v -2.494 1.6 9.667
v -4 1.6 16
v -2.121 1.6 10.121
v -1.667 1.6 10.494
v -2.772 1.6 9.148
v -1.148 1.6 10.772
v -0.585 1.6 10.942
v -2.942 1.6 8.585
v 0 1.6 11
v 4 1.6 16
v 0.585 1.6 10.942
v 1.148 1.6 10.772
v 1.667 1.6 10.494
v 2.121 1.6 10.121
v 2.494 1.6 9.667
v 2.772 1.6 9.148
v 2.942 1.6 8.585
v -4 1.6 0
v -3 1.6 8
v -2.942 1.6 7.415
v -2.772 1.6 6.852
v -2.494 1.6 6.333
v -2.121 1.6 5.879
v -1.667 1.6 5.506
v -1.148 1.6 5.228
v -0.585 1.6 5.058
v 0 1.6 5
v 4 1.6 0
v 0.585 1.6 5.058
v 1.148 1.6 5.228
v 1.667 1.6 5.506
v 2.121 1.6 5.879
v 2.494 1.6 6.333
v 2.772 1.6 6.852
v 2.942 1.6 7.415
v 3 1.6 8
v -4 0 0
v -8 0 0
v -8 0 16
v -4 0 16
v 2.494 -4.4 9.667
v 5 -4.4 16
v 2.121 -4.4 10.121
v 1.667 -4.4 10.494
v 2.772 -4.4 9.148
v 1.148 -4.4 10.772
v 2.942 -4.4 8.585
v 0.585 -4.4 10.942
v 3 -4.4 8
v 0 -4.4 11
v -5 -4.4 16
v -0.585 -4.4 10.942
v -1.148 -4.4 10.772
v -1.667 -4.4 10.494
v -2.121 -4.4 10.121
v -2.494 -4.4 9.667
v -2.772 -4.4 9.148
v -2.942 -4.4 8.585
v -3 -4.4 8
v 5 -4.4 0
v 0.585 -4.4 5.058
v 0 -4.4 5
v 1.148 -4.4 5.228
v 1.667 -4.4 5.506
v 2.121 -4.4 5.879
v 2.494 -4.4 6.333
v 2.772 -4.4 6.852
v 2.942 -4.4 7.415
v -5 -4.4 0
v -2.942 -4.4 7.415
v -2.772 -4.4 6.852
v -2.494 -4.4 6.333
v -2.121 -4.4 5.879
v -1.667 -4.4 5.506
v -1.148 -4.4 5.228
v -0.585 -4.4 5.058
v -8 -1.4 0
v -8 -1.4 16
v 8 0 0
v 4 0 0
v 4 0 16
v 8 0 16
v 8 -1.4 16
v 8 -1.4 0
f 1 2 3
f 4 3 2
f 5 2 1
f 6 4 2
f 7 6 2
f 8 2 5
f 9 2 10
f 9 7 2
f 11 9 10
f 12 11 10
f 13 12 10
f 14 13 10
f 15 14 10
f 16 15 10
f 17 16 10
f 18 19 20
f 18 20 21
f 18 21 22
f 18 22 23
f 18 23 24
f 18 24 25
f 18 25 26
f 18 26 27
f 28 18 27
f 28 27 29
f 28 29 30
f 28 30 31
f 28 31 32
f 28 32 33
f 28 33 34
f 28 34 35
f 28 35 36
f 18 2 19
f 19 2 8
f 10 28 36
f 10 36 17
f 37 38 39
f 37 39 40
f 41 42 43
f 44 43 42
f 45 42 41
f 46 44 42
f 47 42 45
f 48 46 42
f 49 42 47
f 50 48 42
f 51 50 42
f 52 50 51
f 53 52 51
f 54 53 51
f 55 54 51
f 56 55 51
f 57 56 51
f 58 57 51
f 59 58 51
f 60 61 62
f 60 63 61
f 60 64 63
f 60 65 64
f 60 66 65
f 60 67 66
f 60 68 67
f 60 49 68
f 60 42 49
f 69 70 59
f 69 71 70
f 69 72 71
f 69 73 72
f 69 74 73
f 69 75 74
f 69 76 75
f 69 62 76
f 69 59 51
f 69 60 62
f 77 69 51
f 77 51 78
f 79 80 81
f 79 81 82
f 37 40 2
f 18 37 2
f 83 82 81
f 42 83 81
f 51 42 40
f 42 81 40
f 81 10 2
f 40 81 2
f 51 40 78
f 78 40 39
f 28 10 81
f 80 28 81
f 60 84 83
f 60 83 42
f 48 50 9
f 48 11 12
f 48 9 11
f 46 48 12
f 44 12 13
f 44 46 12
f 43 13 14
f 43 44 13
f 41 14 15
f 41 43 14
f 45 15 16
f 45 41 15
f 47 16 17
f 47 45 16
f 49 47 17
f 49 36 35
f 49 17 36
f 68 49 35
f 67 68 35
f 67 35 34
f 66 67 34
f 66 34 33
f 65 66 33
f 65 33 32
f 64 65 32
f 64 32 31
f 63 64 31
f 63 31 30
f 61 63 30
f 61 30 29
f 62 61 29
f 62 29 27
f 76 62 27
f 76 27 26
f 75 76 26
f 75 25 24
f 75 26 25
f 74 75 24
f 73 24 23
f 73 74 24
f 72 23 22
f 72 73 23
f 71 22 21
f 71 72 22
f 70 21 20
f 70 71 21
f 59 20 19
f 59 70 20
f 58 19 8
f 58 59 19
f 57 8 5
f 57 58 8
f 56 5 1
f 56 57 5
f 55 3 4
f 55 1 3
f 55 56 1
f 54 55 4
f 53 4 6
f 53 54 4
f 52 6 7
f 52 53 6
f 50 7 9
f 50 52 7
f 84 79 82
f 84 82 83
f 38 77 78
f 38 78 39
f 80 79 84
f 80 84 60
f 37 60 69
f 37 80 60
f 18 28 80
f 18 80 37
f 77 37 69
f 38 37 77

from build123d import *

# Parameters (mm, degrees)
EXTRUDE_1_DEPTH          = 16
CUT_EXTRUDE_1_DEPTH      = 19.421726303
CUT_EXTRUDE_1_DEPTH_BACK = 19.421726303
SKETCH_2_R               = 3


with BuildPart() as part:
    # 草图1 → 凸台-拉伸1 (new body)
    with BuildSketch(Plane.XY):
        Polygon((5, -4.4), (-5, -4.4), (-8, -1.4), (-8, 0), (-4, 0), (-4, 1.6), (4, 1.6), (4, 0), (8, 0), (8, -1.4), align=None)
    extrude(amount=EXTRUDE_1_DEPTH)

    # 草图2 → 切除-拉伸1 (cut, two sides: drawn at the far end of the back side and taken through both)
    with BuildSketch(Plane(origin=(0, 0, 0), x_dir=(1, 0, 0), z_dir=(0, 1, 0)).offset(-CUT_EXTRUDE_1_DEPTH_BACK)):
        with Locations(Location((0, -8, 0), (0, 0, 270))):
            Circle(SKETCH_2_R)
    extrude(amount=CUT_EXTRUDE_1_DEPTH + CUT_EXTRUDE_1_DEPTH_BACK, mode=Mode.SUBTRACT)


solid = part.part
